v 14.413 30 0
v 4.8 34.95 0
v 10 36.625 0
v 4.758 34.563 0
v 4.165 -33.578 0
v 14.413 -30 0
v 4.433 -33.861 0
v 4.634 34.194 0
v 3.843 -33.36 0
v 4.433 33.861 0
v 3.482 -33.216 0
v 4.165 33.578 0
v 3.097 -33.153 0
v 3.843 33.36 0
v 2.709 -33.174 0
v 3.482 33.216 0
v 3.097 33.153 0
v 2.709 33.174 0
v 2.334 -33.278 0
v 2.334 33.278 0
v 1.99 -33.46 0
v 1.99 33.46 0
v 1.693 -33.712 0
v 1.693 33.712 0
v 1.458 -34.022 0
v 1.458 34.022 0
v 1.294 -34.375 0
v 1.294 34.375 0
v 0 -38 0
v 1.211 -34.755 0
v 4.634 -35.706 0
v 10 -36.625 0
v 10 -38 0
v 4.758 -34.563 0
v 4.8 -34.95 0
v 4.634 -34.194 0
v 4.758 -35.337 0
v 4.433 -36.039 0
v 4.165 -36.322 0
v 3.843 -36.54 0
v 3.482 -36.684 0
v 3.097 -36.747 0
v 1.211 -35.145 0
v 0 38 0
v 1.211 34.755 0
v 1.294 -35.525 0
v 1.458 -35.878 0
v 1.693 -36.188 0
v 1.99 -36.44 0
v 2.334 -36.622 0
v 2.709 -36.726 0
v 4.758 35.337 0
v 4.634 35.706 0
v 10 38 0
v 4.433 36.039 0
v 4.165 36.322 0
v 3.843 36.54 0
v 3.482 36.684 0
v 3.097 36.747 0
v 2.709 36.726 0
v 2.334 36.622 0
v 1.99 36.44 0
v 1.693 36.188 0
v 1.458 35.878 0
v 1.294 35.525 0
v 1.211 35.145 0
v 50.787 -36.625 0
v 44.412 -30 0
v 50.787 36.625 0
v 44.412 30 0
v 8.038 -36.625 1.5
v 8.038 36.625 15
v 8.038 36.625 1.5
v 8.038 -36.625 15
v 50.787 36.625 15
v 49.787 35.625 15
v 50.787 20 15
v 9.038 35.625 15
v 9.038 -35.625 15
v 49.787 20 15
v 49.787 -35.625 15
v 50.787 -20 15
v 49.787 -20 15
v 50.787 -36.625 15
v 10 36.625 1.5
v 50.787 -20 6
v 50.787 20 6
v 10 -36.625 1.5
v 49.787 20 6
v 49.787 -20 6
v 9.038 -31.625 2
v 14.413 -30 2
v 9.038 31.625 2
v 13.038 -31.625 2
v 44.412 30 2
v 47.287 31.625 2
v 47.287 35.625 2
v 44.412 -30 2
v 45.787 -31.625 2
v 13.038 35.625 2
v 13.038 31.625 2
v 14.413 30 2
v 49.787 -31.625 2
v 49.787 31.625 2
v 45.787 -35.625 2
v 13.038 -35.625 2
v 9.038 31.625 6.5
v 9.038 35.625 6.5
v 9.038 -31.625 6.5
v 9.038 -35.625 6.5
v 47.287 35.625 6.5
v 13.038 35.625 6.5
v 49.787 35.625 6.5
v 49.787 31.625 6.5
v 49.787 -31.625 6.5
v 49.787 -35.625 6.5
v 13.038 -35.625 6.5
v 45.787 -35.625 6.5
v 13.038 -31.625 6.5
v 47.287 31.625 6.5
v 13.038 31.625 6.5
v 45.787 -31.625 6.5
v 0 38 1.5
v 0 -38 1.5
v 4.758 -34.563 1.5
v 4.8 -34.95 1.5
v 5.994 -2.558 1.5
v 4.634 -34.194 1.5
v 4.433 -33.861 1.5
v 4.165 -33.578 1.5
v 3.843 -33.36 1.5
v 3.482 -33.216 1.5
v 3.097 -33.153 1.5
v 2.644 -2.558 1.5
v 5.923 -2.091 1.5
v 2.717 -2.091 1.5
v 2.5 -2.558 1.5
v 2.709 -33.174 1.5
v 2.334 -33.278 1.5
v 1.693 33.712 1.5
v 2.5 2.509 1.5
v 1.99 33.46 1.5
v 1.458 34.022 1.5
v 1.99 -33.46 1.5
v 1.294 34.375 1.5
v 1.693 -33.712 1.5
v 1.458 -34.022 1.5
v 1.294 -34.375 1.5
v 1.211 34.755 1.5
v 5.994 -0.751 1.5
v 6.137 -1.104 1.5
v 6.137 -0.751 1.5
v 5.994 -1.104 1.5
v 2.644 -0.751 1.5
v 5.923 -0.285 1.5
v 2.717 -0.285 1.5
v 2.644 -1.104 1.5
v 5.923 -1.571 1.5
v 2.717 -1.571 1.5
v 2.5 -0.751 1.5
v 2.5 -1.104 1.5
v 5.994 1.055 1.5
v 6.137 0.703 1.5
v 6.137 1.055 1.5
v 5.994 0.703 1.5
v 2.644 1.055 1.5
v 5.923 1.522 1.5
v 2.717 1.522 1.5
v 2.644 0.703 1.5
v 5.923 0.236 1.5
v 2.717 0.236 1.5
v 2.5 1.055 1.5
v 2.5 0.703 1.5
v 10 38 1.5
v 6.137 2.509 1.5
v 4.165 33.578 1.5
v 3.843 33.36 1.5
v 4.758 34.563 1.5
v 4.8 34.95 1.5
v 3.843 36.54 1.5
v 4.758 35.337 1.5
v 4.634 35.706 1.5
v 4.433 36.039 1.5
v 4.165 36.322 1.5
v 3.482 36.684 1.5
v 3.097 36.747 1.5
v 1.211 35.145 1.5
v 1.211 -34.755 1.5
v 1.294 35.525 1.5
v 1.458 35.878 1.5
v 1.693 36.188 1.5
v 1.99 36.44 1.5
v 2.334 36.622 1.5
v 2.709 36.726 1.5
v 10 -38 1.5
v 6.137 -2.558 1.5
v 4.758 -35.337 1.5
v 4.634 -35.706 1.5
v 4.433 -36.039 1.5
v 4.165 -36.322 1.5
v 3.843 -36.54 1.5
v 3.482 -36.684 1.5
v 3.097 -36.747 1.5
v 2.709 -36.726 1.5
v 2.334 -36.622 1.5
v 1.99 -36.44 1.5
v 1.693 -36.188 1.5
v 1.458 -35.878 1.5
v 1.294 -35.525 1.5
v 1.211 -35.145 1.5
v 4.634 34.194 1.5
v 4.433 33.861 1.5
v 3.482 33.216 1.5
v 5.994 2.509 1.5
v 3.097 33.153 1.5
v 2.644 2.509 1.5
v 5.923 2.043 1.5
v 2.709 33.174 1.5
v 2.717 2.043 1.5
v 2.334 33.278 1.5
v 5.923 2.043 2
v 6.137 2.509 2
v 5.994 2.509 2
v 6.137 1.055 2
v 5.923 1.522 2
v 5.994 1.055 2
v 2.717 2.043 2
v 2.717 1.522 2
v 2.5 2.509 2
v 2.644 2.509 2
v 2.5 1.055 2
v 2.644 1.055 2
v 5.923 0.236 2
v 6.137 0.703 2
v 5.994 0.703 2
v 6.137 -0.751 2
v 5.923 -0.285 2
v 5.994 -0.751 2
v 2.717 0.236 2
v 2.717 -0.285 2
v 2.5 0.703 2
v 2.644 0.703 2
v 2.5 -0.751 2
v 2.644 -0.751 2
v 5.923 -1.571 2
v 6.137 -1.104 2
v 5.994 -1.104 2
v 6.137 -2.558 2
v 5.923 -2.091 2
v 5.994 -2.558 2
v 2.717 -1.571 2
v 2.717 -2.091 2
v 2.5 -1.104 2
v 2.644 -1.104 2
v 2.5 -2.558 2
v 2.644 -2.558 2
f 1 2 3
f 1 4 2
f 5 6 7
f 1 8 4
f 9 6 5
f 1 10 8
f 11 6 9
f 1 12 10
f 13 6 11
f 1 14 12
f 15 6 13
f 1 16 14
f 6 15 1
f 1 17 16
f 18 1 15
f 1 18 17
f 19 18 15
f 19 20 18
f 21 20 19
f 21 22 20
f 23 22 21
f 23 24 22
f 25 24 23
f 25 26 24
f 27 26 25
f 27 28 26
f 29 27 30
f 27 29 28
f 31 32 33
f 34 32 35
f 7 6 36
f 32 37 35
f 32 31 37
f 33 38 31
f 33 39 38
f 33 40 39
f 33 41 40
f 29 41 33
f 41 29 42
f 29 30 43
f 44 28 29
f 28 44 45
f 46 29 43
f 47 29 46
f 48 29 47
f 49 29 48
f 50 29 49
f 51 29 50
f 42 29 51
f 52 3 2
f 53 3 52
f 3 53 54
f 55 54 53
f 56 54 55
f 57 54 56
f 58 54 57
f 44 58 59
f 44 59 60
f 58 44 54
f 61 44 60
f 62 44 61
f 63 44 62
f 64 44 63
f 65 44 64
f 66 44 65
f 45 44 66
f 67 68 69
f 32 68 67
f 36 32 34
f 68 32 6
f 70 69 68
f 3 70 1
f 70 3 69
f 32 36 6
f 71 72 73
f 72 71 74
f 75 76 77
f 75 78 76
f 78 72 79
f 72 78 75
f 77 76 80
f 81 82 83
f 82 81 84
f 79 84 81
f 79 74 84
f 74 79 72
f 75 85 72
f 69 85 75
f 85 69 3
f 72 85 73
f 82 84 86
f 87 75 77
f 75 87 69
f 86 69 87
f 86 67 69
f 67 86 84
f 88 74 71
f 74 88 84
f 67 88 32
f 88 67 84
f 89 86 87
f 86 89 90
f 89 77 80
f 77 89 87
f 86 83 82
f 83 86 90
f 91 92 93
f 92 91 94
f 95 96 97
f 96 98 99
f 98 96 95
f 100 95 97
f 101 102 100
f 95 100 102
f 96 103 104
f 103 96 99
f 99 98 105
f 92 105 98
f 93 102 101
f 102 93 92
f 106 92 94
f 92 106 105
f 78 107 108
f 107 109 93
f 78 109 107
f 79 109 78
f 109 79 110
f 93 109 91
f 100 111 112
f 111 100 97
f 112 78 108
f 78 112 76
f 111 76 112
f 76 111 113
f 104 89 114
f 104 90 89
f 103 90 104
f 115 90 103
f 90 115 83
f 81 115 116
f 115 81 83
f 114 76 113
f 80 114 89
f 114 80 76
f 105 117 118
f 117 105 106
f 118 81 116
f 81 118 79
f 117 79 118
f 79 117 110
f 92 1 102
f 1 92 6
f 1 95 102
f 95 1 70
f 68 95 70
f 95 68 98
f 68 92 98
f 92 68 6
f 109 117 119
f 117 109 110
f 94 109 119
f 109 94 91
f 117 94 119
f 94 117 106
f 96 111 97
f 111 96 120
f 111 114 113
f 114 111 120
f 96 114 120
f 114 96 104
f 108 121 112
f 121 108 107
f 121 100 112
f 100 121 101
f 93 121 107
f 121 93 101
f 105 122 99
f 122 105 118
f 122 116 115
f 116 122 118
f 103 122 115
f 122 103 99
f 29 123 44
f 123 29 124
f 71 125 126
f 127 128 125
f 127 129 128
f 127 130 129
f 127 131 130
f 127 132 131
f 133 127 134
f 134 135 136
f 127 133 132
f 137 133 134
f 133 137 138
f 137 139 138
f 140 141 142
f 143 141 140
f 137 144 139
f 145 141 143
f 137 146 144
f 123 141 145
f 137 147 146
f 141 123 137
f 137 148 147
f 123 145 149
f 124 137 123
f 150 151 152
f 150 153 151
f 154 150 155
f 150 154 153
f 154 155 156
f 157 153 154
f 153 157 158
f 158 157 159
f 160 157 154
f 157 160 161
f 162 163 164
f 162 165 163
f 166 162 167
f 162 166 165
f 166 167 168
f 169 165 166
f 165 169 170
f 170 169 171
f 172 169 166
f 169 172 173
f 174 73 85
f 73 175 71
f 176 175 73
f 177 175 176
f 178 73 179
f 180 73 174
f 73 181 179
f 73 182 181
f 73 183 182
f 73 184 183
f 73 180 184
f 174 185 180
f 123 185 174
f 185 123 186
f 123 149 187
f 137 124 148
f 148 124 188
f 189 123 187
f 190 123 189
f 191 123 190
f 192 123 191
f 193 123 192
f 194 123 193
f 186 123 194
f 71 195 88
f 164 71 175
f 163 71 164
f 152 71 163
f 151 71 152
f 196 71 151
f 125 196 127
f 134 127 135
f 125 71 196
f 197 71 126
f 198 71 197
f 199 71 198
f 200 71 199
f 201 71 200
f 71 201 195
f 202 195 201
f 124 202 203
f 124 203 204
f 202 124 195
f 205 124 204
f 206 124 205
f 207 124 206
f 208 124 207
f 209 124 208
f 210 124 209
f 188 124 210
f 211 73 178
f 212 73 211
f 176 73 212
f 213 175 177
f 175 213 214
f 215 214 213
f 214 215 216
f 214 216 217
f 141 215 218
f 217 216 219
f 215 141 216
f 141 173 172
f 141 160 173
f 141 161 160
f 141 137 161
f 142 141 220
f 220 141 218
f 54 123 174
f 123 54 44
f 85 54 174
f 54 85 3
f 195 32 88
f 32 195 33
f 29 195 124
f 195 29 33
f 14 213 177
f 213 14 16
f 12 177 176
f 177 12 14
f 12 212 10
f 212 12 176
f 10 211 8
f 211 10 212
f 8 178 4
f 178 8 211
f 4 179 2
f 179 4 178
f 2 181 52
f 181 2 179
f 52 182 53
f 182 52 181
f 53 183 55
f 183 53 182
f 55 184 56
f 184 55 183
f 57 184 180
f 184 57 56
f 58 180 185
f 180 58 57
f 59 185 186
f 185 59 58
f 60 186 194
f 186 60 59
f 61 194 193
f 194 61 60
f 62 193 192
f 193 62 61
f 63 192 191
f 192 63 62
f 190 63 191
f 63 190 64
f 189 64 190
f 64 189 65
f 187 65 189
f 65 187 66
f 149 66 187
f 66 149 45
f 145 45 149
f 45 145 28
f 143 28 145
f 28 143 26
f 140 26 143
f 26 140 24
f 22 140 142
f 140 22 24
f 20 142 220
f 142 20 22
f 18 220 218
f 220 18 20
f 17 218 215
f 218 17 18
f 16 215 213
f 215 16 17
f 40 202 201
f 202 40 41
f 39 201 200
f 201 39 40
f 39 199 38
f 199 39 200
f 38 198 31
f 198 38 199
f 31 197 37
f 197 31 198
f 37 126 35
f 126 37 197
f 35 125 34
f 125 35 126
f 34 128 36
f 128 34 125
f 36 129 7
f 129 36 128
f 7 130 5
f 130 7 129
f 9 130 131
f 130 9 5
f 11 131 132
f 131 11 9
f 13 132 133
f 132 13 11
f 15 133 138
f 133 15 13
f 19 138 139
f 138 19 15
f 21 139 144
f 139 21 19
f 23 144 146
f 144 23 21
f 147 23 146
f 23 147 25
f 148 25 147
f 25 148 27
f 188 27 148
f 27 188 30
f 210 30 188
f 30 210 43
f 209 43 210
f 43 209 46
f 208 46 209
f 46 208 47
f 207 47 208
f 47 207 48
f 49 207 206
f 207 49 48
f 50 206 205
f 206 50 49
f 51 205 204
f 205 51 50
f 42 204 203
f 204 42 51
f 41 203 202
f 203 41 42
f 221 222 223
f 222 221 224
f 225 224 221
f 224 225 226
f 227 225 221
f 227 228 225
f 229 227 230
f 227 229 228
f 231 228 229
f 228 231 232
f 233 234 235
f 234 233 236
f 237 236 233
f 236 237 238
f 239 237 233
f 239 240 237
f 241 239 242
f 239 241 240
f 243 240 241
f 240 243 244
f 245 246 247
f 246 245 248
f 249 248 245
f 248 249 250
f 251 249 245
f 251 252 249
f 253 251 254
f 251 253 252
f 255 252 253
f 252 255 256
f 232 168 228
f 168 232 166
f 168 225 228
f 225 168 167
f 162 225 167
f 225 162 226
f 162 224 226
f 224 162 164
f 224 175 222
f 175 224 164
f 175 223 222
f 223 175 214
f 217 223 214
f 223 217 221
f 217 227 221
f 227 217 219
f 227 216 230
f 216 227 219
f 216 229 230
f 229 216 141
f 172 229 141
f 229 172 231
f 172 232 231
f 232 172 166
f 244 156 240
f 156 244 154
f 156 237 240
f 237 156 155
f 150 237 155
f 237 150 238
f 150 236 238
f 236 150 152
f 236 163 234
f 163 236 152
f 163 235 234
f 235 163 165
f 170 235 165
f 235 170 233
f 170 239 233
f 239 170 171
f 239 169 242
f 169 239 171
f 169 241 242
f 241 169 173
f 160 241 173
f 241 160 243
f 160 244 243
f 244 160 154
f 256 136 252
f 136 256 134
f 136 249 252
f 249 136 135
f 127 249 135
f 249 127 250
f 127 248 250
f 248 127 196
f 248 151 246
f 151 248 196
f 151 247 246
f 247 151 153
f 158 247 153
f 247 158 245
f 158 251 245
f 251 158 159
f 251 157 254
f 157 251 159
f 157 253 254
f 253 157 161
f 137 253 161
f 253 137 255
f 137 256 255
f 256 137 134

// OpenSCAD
$fa = 1;
$fs = 0.4;

hole_sep_actbot = 69.9;
hole_sep_pcb = 65;
hole_radius = 1.8;


// hole_pair(hole_radius,hole_sep)
module hole_pair(hole_radius=hole_radius,hole_sep = hole_sep_actbot){
linear_extrude(height=1){
        translate([0,hole_sep/2])circle(r=hole_radius);
        translate([0,-hole_sep/2])circle(r=hole_radius);
    }
}

// drilled_hole_pair(hole_radius,hole_sep,x_clr,y_clr)
module drilled_hole_pair(hole_radius=hole_radius,hole_sep = hole_sep_actbot,x_clr=1,y_clr=1){
difference(){
    L = 2*hole_radius+x_clr;
    W = hole_sep+2*hole_radius+y_clr;
    linear_extrude(height=1,convexity=5)translate([-L/2,-W/2])square([L,W]);
    translate([0,0,-0.01])scale([1,1,1.02])hole_pair(hole_radius,hole_sep_actbot);
}
}


// simple test:
//drilled_hole_pair(hole_radius,hole_sep_actbot);
//translate([10,0,0])hole_pair(hole_radius,hole_sep_actbot);

actpcb_L = 40+0.75;
actpcb_W = 70+1.25;
module actbot_pcb_outline(L=10,W=10){
    translate([-L/2,-W/2])square([L,W]);
}
module actbot_pcb_containter(wall_thickness=2,wall_height=2+4+9,base_thick=2){
    L = actpcb_L;
    W = actpcb_W;
    difference(){
        linear_extrude(height=wall_height,convexity=10)actbot_pcb_outline(L+wall_thickness,W+wall_thickness);
        translate([20,-20,base_thick+4])linear_extrude(height=20,convexity=10)square([10,40]);
        translate([0,0,base_thick])linear_extrude(height=wall_height-base_thick+0.1,convexity=10)actbot_pcb_outline(L,W);
        //translate([0,-30,0])cube([40,80,20]); //sectioner
        C_L = 30;
        C_W = 60;
        translate([-C_L/2,-C_W/2,-0.1])linear_extrude(height=3,convexity=10)square([C_L,C_W]);
    }
    translate([-actpcb_L/2,-actpcb_W/2,base_thick])linear_extrude(height=4.5,convexity=10)square([4,4]);
    translate([actpcb_L/2-2.5,actpcb_W/2-4,base_thick])linear_extrude(height=4.5,convexity=10)square([2.5,4]);
    translate([-actpcb_L/2,actpcb_W/2-4,base_thick])linear_extrude(height=4.5,convexity=10)square([4,4]);
    translate([actpcb_L/2-4,-actpcb_W/2,base_thick])linear_extrude(height=4.5,convexity=10)square([4,4]);

}
translate([actpcb_L/2*1.1+7,0,0])actbot_pcb_containter();

L = 10;
W = 76;
difference(){
linear_extrude(height=1.5,convexity=5)translate([0,-W/2])square([L,W]);
translate([3,0,-0.1])scale([1,1,2])hole_pair(hole_radius,hole_sep_actbot);
//translate([15,0,-0.1])scale([1,1,2])hole_pair(hole_radius,hole_sep_pcb);
}

translate([2.5,0,0])rotate([0,0,-90])linear_extrude(2)text("III",size=4,font="Times New Roman",halign="center");
